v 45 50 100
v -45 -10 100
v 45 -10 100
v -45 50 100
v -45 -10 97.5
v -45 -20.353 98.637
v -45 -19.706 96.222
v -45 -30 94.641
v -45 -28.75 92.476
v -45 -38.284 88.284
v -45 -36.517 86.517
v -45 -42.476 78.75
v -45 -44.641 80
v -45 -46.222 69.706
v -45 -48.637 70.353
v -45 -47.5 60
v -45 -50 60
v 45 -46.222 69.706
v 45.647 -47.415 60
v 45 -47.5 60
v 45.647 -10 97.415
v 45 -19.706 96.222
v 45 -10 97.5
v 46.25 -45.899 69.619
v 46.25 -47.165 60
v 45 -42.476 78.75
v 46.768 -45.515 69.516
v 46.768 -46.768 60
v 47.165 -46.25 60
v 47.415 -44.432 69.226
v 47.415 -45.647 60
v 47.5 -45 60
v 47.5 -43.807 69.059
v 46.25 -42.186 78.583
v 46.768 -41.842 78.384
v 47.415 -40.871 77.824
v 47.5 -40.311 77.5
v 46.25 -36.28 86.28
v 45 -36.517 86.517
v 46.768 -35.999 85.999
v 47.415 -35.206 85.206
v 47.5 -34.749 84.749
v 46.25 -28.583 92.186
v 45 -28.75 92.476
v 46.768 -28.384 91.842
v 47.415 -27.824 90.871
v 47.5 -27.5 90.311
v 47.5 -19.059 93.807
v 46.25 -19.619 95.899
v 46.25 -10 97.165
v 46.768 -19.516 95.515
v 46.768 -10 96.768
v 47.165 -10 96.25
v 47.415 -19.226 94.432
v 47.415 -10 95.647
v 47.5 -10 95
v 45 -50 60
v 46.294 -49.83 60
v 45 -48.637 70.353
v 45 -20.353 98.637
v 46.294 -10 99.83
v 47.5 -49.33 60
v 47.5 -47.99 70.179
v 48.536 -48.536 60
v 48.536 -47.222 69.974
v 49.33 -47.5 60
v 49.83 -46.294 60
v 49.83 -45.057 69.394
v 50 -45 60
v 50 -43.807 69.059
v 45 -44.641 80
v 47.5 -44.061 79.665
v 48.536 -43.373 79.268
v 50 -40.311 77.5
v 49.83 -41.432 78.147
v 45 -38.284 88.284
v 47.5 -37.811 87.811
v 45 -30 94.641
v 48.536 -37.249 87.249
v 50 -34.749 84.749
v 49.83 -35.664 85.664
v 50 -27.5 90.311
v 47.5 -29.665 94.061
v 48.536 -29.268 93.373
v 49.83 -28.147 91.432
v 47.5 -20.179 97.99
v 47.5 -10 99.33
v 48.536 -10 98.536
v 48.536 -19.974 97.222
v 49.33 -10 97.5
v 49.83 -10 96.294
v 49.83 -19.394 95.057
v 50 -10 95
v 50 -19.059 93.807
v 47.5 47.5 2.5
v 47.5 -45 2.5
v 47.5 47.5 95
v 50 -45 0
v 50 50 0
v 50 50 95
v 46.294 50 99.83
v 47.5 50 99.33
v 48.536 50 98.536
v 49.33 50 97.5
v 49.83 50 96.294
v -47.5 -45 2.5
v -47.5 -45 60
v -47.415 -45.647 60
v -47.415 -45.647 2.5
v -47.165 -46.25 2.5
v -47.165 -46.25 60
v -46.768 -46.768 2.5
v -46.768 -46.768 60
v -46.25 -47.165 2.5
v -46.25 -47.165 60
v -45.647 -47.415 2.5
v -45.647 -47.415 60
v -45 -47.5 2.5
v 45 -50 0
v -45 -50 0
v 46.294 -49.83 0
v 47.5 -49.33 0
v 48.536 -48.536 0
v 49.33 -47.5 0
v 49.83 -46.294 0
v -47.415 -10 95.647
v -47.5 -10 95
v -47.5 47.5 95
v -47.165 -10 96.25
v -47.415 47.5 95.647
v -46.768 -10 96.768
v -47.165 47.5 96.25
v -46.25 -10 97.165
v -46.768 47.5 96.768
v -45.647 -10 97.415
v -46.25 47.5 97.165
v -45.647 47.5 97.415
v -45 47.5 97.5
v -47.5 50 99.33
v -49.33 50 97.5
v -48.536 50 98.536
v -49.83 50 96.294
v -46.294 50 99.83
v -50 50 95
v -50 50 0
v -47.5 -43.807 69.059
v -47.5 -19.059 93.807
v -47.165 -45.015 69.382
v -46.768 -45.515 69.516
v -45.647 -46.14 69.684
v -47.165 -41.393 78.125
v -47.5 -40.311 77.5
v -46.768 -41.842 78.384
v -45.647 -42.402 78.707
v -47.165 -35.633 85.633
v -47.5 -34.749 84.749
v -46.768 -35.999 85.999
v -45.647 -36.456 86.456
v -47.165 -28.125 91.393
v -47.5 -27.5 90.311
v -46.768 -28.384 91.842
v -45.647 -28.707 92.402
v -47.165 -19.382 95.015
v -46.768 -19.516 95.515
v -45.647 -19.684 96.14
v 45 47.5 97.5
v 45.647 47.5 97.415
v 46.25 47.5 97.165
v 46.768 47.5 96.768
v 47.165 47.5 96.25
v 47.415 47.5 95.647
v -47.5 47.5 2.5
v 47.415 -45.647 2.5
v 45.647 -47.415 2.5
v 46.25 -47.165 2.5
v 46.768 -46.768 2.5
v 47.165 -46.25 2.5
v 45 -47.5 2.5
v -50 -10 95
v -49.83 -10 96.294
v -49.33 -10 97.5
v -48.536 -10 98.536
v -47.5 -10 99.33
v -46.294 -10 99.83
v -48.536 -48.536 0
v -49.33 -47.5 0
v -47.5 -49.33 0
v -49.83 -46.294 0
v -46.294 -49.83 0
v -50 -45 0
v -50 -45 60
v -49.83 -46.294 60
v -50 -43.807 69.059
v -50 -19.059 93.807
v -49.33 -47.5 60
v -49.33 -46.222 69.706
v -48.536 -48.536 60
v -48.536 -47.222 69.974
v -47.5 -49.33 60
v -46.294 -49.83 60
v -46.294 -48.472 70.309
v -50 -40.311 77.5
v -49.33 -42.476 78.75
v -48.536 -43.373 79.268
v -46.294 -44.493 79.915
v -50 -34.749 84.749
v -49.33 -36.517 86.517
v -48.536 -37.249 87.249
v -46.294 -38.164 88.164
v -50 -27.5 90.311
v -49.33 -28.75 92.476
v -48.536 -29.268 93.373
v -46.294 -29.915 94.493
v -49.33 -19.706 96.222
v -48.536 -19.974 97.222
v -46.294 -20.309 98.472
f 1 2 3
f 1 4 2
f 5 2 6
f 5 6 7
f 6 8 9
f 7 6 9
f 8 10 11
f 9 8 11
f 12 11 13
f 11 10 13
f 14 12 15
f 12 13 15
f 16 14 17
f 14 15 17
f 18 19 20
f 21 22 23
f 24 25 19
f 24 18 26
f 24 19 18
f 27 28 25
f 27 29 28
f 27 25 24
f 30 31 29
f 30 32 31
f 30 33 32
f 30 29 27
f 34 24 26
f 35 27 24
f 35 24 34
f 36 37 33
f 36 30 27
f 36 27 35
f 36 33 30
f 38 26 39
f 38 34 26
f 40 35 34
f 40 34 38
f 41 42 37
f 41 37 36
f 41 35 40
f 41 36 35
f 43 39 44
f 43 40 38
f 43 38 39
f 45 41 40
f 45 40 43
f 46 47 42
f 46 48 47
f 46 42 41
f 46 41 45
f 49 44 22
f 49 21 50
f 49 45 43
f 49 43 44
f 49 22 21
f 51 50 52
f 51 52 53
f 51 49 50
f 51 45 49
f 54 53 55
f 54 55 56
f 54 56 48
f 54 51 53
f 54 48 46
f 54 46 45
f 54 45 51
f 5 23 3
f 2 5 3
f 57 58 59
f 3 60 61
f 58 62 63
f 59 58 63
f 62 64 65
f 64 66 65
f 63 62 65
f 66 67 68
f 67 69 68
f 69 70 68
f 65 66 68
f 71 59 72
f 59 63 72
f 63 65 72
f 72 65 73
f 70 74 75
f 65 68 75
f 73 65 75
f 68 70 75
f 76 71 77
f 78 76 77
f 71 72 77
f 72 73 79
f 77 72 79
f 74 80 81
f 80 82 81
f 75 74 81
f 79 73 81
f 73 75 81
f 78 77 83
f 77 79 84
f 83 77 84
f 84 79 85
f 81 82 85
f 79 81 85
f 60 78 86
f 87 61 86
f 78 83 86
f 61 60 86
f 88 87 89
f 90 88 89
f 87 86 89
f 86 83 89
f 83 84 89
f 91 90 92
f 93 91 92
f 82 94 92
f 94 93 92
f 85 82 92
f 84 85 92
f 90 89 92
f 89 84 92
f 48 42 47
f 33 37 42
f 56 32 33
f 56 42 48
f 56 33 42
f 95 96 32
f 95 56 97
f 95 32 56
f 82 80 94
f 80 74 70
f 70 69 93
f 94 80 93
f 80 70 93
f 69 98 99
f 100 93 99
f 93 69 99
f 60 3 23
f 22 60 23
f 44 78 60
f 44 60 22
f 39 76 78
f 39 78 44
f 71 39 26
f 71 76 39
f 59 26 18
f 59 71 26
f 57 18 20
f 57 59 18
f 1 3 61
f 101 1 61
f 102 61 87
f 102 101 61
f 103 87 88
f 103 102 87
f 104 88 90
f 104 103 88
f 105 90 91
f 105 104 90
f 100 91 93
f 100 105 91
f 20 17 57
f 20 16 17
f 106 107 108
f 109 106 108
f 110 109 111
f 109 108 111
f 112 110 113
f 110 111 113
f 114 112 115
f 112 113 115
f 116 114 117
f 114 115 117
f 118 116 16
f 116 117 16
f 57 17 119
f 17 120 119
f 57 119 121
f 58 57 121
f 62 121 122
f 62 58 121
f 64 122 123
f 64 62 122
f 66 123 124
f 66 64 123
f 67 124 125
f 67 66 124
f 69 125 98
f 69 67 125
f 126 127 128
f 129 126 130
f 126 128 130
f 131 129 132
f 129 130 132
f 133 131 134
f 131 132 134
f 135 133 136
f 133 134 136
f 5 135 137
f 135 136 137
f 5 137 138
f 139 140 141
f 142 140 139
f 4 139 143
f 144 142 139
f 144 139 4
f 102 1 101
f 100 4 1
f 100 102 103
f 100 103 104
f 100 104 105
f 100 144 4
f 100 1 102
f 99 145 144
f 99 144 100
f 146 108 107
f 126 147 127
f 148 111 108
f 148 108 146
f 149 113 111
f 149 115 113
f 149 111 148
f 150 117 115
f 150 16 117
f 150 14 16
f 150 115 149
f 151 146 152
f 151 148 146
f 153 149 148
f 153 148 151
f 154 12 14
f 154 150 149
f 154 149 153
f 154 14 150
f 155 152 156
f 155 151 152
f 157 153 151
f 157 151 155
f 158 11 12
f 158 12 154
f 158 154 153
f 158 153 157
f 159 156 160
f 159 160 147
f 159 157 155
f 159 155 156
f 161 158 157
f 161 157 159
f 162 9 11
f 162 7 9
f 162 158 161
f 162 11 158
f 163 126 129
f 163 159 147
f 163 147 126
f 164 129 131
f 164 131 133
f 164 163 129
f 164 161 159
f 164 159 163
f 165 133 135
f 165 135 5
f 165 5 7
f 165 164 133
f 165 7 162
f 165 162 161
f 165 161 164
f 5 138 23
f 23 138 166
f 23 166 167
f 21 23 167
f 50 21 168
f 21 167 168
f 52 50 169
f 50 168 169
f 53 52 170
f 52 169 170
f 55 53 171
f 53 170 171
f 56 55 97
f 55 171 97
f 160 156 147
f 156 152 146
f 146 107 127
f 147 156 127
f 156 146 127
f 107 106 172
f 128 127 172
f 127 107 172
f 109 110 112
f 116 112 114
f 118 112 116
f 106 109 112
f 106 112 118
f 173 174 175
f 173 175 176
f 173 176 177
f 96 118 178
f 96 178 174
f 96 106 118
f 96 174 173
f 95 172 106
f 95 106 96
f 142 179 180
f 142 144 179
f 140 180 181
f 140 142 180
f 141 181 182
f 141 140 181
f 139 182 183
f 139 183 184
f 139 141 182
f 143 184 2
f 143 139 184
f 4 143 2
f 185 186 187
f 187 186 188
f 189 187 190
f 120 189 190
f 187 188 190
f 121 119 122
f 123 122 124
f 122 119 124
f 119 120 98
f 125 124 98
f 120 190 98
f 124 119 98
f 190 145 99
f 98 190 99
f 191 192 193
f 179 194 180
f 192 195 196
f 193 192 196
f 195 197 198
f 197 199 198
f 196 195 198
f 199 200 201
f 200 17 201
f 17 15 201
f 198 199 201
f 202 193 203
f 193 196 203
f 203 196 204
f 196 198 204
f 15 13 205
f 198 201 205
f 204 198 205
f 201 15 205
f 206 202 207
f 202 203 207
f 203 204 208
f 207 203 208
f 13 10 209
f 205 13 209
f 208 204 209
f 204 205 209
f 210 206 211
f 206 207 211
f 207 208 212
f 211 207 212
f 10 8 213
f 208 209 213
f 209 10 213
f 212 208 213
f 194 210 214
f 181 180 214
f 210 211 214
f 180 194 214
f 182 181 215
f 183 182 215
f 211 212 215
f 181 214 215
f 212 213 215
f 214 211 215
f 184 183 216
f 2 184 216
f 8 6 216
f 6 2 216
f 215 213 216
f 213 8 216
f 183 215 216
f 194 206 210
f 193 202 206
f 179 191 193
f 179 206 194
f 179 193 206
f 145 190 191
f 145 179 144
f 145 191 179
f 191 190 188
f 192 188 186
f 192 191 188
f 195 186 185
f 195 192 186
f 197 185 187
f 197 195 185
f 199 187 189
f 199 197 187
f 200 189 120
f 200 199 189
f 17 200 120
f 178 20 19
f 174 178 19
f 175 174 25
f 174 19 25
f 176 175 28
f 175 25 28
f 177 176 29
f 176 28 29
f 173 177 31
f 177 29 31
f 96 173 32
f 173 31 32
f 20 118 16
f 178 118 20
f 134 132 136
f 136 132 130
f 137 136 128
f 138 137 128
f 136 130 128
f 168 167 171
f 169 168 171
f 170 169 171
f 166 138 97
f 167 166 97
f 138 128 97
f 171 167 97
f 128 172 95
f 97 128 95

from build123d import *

# Parameters (mm, degrees)
F0_W     = 100
F0_H     = 100
F1_DEPTH = 100
F2_R     = 40
F3_R     = 5
F4_T     = 2.5


# Not quite as in the source:
# - a shell that OpenCascade refuses in one call is made with other operations: the cavity is built on its own and cut out


with BuildPart() as f1:
    # F0 (on Top) → F1 (new body)
    with BuildSketch(Plane.XY):
        Rectangle(F0_W, F0_H)
    extrude(amount=F1_DEPTH)

    # F2
    f2_edges = [f1.edges().sort_by_distance(p)[0] for p in [
        (0, -50, 100),
    ]]
    fillet(f2_edges, radius=F2_R)

    # F3
    f3_edges = [f1.edges().sort_by_distance(p)[0] for p in [
        (50, 20, 100),
        (-50, 20, 100),
    ]]
    fillet(f3_edges, radius=F3_R)

    # F4: shell of thickness 2.5, made by hand


with BuildPart() as f4_core1:
    # F4_t2: copy of F1
    add(f1.part)

    # the walls: a layer under each face that stays
    f4_faces = [f4_core1.faces().sort_by_distance(p)[0] for p in [
        (0, -50, 30),
        (-48.5355339059, -48.5355339059, 30),
        (48.5355339059, -48.5355339059, 30),
        (0, 0, 0),
        (-48.5355339059, -37.2487373415, 87.2487373415),
        (48.5355339059, -37.2487373415, 87.2487373415),
        (0, 20, 100),
        (-50, 2.5, 47.5),
        (50, 2.5, 47.5),
        (0, 50, 50),
        (-48.5355339059, 20, 98.5355339059),
        (48.5355339059, 20, 98.5355339059),
    ]]
    thicken(f4_faces, amount=-F4_T, mode=Mode.SUBTRACT)


with BuildPart() as f1_1:
    add(f1.part)

    # what is left inside the walls is the cavity
    f4_cavity = [f4_core1.part.solids().sort_by_distance(p)[0] for p in [
        (0, -15.833333, 2.525),
    ]]
    add(f4_cavity, mode=Mode.SUBTRACT)


solid = f1_1.part
